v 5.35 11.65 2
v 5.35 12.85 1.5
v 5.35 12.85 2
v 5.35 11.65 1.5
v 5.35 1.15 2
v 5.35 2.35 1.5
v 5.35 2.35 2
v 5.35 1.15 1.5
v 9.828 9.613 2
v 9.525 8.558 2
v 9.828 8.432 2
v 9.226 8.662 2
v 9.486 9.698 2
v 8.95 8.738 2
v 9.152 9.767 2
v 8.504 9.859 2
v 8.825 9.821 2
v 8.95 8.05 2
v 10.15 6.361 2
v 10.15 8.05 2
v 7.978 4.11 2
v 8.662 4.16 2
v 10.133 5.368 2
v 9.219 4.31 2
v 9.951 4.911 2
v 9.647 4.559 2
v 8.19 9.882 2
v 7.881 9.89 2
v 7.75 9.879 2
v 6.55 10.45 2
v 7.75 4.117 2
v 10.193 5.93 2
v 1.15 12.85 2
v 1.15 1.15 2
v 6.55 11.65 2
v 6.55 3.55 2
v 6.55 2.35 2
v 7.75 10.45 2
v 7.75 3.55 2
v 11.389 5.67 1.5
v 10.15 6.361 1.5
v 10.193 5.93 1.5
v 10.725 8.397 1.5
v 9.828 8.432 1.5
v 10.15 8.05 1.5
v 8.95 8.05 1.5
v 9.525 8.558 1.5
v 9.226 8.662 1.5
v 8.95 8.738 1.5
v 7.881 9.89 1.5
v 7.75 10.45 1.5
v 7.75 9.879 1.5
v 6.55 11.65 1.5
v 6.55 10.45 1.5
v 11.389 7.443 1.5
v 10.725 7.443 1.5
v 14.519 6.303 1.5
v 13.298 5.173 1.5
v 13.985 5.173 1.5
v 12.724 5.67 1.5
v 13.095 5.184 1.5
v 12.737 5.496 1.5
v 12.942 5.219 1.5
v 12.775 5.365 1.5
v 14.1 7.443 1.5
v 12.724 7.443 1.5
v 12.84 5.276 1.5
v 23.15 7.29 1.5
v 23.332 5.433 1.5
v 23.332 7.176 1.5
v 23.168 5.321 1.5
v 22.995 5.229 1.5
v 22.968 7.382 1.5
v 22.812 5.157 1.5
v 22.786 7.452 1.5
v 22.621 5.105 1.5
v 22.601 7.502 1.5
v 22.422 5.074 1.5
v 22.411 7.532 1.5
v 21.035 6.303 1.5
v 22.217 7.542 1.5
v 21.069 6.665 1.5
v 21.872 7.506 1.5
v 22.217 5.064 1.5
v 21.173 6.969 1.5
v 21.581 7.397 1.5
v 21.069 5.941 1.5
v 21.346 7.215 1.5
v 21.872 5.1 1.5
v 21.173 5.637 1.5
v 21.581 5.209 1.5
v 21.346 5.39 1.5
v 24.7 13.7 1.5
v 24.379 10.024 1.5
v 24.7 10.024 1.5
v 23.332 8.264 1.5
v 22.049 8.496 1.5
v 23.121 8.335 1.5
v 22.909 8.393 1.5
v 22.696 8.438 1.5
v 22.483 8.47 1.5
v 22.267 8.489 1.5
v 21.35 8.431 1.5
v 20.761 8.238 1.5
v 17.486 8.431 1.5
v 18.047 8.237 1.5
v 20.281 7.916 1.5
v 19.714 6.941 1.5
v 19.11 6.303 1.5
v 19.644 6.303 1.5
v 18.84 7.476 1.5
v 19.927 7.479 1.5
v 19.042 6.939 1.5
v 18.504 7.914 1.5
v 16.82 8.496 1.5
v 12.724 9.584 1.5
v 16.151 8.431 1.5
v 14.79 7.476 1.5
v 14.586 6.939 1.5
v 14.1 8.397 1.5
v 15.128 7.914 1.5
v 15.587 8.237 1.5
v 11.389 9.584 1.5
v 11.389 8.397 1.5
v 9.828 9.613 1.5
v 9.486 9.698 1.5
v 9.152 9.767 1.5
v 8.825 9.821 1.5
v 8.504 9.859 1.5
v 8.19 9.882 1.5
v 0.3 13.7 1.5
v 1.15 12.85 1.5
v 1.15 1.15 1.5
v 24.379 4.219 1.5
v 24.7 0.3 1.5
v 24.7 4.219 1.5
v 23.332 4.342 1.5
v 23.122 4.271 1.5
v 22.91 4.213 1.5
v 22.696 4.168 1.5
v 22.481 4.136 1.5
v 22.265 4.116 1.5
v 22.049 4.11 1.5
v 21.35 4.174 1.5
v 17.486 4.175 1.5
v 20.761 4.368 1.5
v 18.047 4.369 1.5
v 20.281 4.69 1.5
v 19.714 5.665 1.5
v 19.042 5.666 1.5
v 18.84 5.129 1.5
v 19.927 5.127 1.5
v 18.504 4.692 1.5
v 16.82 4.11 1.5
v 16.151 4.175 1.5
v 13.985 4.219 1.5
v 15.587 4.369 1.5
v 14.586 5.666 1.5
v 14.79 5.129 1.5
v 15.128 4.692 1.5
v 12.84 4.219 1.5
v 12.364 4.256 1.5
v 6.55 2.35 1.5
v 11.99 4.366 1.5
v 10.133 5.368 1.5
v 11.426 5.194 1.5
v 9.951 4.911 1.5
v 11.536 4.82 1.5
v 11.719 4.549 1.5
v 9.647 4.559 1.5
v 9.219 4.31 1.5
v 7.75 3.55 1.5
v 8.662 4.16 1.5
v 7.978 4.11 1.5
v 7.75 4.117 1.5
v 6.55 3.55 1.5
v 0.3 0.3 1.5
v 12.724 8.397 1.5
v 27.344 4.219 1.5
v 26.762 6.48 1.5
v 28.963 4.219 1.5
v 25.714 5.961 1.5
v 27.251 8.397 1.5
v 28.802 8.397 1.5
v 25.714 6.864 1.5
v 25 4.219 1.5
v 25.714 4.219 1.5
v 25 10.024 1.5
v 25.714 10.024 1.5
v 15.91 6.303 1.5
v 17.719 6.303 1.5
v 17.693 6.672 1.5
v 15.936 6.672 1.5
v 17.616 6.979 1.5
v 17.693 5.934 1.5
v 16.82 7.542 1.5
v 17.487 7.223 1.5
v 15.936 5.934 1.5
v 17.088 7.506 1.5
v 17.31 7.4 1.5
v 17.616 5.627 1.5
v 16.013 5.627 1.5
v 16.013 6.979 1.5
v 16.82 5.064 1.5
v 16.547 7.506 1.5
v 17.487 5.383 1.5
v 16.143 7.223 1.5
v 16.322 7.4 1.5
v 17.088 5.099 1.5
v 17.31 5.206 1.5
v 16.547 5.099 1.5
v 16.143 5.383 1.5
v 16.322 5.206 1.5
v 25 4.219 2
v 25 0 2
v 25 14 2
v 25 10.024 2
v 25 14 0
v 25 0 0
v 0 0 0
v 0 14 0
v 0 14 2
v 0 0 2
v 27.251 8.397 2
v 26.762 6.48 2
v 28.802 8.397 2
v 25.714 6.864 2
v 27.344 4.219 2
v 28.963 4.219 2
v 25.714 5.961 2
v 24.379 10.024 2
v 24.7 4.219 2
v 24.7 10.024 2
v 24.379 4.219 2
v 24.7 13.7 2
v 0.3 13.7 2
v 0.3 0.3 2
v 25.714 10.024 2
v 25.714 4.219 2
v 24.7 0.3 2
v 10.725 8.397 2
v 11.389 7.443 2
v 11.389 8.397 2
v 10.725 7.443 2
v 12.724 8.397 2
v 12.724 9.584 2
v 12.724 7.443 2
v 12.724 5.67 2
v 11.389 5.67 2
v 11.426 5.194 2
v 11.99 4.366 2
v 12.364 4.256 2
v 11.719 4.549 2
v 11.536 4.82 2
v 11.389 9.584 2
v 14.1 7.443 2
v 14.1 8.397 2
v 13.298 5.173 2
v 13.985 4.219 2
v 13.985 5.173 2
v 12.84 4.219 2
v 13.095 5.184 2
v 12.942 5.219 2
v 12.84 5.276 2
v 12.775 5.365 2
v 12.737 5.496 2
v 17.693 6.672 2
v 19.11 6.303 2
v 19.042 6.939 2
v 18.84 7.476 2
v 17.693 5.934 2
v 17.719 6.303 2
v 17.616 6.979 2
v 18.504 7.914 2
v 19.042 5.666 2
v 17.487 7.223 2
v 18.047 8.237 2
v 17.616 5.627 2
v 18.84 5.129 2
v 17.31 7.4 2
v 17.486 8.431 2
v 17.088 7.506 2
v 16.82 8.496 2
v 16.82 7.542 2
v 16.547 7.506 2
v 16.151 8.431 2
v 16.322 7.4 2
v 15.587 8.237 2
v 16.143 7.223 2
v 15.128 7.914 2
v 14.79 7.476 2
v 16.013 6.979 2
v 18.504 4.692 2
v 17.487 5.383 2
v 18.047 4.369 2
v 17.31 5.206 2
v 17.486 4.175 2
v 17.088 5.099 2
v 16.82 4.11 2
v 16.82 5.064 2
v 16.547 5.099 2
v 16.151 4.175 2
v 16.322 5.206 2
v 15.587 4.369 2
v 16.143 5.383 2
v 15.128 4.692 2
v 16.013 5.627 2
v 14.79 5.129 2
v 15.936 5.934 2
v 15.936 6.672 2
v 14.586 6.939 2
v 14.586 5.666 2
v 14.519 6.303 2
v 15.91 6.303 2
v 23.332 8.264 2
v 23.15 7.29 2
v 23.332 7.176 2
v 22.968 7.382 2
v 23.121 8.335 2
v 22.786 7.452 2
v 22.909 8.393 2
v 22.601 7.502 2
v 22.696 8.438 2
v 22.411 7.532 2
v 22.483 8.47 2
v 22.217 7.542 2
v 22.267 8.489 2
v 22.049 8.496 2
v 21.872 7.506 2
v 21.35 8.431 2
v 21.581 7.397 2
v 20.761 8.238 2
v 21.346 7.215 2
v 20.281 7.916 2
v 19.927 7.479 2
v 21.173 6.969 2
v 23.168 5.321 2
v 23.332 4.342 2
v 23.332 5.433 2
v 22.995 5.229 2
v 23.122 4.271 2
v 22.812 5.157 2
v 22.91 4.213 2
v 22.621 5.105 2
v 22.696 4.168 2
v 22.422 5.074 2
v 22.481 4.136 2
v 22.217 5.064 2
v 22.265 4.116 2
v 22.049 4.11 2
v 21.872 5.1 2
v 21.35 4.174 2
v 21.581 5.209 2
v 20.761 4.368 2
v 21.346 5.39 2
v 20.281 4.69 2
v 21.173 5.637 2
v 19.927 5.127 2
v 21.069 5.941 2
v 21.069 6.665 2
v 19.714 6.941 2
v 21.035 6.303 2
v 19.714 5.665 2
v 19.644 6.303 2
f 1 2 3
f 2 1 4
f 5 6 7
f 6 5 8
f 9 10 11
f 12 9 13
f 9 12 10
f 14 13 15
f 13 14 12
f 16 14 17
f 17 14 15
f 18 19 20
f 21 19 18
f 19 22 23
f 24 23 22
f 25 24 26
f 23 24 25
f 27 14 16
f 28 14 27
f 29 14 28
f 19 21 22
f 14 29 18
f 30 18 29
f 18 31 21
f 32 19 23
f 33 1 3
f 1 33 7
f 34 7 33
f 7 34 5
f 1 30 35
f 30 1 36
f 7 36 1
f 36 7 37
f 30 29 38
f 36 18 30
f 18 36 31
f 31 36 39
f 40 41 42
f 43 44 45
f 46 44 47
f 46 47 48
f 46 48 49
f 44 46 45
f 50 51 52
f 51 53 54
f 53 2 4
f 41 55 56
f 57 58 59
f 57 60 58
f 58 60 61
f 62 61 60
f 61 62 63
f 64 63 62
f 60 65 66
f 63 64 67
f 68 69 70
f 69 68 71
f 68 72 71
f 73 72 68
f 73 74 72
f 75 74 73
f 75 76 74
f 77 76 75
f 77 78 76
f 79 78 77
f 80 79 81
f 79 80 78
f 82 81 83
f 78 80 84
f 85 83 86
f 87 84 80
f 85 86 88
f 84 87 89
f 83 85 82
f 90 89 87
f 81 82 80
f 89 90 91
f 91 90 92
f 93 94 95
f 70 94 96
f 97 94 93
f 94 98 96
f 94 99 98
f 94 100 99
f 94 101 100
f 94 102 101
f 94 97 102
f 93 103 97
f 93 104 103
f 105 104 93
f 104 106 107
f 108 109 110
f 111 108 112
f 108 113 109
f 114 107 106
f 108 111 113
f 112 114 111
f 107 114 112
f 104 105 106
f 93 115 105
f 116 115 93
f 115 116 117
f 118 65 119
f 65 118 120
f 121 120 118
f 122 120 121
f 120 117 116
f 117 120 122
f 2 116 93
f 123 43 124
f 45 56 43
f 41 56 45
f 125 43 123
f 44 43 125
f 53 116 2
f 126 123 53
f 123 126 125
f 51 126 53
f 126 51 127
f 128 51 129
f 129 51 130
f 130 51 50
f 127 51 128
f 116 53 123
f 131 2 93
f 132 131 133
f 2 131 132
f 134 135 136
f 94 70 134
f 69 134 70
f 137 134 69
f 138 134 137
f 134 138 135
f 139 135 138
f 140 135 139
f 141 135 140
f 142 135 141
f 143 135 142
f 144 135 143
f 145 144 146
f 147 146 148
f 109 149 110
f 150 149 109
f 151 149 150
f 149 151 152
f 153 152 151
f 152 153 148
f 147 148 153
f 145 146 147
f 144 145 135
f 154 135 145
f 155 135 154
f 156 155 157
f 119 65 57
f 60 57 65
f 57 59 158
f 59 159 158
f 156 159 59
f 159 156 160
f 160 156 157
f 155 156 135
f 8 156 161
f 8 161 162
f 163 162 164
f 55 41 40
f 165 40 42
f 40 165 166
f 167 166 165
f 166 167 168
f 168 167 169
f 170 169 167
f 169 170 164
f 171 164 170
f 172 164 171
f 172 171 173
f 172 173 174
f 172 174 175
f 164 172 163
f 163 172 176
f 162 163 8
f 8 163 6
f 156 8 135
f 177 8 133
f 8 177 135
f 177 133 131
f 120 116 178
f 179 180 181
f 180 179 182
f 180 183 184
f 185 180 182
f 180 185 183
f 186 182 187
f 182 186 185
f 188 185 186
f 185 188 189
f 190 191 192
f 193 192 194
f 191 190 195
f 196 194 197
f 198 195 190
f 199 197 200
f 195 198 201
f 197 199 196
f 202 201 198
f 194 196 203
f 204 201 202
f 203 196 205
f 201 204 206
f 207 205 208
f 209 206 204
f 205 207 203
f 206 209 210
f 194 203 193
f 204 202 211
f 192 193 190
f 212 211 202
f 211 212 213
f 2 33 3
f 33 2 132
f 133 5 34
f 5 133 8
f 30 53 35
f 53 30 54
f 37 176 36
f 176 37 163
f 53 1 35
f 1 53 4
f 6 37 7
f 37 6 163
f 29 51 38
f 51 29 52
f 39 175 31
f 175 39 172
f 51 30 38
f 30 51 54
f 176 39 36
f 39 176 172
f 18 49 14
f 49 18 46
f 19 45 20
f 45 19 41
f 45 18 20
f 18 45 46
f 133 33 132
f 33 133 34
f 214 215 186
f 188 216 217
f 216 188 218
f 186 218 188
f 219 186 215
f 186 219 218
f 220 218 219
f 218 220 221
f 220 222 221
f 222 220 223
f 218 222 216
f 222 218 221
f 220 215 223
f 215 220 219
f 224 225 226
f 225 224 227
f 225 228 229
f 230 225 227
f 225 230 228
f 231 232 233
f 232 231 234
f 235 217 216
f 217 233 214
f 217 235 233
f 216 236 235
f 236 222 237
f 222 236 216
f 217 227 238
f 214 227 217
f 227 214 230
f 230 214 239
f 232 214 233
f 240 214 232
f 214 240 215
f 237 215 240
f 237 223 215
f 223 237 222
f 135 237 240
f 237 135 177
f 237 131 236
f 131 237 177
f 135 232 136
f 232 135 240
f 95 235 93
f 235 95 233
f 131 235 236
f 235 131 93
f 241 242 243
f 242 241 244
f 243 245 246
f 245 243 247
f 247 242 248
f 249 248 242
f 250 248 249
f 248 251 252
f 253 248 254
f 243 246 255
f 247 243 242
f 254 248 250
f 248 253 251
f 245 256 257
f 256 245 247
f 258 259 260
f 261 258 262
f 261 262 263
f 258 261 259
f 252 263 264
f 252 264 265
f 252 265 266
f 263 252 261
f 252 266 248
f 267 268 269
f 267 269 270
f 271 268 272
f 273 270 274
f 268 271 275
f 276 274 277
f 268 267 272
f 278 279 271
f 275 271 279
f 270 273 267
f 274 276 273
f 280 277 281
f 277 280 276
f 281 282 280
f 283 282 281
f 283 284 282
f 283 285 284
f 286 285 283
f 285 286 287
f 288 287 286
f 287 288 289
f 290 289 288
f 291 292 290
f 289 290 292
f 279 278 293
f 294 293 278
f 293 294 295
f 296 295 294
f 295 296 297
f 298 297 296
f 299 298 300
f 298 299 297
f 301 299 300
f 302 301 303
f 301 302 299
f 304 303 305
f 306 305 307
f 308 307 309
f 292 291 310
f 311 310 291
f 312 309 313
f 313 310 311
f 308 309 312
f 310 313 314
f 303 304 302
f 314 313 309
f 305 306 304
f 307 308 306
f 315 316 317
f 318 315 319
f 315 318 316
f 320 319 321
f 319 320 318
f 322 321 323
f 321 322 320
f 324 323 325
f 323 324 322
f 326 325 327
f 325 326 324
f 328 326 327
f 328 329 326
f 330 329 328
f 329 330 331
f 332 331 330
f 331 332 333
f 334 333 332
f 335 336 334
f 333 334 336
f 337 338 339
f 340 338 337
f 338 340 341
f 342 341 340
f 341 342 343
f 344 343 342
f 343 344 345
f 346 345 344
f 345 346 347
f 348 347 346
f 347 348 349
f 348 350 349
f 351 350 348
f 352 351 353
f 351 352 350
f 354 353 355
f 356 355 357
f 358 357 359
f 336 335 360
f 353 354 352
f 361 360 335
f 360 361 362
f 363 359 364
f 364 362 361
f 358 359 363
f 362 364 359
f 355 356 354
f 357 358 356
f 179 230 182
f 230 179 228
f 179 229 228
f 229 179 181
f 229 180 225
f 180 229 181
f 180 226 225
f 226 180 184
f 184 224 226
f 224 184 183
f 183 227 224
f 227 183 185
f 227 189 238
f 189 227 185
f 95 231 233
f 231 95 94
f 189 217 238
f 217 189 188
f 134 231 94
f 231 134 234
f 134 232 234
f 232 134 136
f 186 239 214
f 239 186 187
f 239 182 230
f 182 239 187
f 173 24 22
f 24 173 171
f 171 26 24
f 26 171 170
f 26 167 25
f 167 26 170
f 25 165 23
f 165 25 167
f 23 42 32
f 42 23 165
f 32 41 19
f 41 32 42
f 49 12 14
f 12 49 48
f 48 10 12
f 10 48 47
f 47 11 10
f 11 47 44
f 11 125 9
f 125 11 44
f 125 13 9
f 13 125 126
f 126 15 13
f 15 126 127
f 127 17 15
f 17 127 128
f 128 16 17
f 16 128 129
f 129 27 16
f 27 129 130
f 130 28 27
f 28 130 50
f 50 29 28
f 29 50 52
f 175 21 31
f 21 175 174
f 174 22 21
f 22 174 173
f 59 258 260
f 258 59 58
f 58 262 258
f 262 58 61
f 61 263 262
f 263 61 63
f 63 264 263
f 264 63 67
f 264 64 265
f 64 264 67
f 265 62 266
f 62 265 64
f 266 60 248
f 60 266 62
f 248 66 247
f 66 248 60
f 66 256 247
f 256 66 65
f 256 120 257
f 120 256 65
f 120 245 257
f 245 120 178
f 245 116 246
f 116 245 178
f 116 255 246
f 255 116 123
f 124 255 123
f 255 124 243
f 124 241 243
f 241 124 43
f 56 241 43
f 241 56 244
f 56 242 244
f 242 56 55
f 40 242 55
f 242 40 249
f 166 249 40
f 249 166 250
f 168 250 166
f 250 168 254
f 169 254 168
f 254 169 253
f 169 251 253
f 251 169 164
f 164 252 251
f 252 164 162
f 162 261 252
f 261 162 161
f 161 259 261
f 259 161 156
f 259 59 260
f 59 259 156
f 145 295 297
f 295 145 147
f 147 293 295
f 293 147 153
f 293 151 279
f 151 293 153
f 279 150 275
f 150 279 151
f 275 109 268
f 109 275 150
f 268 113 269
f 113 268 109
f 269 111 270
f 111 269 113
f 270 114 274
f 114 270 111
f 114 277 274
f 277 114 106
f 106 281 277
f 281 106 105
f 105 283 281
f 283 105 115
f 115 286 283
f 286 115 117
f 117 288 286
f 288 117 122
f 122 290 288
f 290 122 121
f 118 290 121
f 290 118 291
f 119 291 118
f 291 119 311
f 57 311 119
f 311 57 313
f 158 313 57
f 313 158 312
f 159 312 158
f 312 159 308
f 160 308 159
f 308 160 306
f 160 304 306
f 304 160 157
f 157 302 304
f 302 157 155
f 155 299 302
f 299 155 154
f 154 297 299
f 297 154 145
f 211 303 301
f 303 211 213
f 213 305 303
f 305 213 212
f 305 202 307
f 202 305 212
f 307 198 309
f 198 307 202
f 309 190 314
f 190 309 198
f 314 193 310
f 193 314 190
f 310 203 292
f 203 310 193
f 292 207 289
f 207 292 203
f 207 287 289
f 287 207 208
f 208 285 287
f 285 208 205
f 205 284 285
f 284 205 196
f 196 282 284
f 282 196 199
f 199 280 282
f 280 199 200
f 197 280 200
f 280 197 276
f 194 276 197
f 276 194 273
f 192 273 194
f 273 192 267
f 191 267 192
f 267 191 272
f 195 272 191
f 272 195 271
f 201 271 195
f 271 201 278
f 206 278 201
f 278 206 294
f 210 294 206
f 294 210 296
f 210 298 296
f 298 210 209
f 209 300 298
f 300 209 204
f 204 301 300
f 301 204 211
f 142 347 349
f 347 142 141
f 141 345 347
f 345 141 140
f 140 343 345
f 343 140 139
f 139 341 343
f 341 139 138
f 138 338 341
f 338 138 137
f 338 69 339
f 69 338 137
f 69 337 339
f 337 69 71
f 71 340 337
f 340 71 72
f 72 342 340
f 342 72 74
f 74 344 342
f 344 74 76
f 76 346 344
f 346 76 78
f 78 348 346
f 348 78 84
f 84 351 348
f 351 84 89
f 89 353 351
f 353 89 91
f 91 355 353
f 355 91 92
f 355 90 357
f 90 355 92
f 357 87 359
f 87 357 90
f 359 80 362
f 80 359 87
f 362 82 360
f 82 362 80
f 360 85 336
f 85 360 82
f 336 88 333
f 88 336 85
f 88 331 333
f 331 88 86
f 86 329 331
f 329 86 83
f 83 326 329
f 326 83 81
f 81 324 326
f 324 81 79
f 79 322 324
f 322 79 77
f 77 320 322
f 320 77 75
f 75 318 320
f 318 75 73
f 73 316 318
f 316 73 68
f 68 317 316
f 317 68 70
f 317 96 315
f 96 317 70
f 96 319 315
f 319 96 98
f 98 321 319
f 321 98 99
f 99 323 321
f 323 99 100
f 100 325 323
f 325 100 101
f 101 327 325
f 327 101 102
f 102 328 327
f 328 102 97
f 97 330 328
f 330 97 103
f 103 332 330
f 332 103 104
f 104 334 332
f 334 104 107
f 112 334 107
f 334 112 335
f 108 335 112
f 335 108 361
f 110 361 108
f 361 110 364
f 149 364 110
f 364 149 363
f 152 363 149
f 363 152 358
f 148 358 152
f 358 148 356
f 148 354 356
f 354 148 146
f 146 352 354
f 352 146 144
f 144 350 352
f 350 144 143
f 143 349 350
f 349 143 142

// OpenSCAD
// file: CommonModules.scad
//    $$$$$$\   $$$$$$\   $$$$$$\  $$\   $$\ $$$$$$\ $$$$$$$\  $$$$$$$$\ 
//    $$  __$$\ $$  __$$\ $$  __$$\ $$ |  $$ |\_$$  _|$$  __$$\ $$  _____|
//    $$ /  $$ |$$ /  \__|$$ /  $$ |$$ |  $$ |  $$ |  $$ |  $$ |$$ |      
//    $$$$$$$$ |$$ |      $$ |  $$ |$$ |  $$ |  $$ |  $$$$$$$  |$$$$$\    
//    $$  __$$ |$$ |      $$ |  $$ |$$ |  $$ |  $$ |  $$  __$$< $$  __|   
//    $$ |  $$ |$$ |  $$\ $$ $$\$$ |$$ |  $$ |  $$ |  $$ |  $$ |$$ |      
//    $$ |  $$ |\$$$$$$  |\$$$$$$ / \$$$$$$  |$$$$$$\ $$ |  $$ |$$$$$$$$\ 
//    \__|  \__| \______/  \___$$$\  \______/ \______|\__|  \__|\________|
//                            \___|                                      
//      
//       Print and play - OpenScad project - by Bekkalizer and ChatGPT
// 
// This file is part of the Acquire stl project.
// Copyright (C) 2025 Bekkalizer
//
// Acquire stl project is free software: you can redistribute it and/or modify
// it under the terms of the GNU General Public License as published
// by the Free Software Foundation, either version 3 of the License,
// or (at your option) any later version.
//
// Acquire stl project is distributed in the hope that it will be useful,
// but WITHOUT ANY WARRANTY; without even the implied warranty of
// MERCHANTABILITY or FITNESS FOR A PARTICULAR PURPOSE. See the
// GNU General Public License for more details.
//
// You should have received a copy of the GNU General Public License
// along with this program. If not, see <https://www.gnu.org/licenses/>.

module cube_with_extruded_bottom( cube_size = [19.5, 19.5, 5] ) {
    //Main build script parameters:
    max_width = 19.2;
    top_lip = 2;
    top_height = 3;
    //Calculated hole size:
    inside_margins = 1;
    hole_width = max_width - 2 * (top_lip) + inside_margins;
    hole_height = top_height + inside_margins;
    
    hole_size = [hole_width, hole_width, hole_height]; // Hole dimensions (same height as cube)
    hole_offset = [(cube_size[0] - hole_size[0]) / 2, (cube_size[1] - hole_size[1]) / 2, -0.1]; // Centered on bottom
    difference() {
        // Main Cube
        cube(cube_size);
        
        // Hole Cube (subtracting from bottom)
        translate(hole_offset)
            cube(hole_size);
    }
}
// main file
//    $$$$$$\   $$$$$$\   $$$$$$\  $$\   $$\ $$$$$$\ $$$$$$$\  $$$$$$$$\ 
//    $$  __$$\ $$  __$$\ $$  __$$\ $$ |  $$ |\_$$  _|$$  __$$\ $$  _____|
//    $$ /  $$ |$$ /  \__|$$ /  $$ |$$ |  $$ |  $$ |  $$ |  $$ |$$ |      
//    $$$$$$$$ |$$ |      $$ |  $$ |$$ |  $$ |  $$ |  $$$$$$$  |$$$$$\    
//    $$  __$$ |$$ |      $$ |  $$ |$$ |  $$ |  $$ |  $$  __$$< $$  __|   
//    $$ |  $$ |$$ |  $$\ $$ $$\$$ |$$ |  $$ |  $$ |  $$ |  $$ |$$ |      
//    $$ |  $$ |\$$$$$$  |\$$$$$$ / \$$$$$$  |$$$$$$\ $$ |  $$ |$$$$$$$$\ 
//    \__|  \__| \______/  \___$$$\  \______/ \______|\__|  \__|\________|
//                            \___|                                      
//      
//       Print and play - OpenScad project - by Bekkalizer and ChatGPT
// 
// This file is part of the Acquire stl project.
// Copyright (C) 2025 Bekkalizer
//
// Acquire stl project is free software: you can redistribute it and/or modify
// it under the terms of the GNU General Public License as published
// by the Free Software Foundation, either version 3 of the License,
// or (at your option) any later version.
//
// Acquire stl project is distributed in the hope that it will be useful,
// but WITHOUT ANY WARRANTY; without even the implied warranty of
// MERCHANTABILITY or FITNESS FOR A PARTICULAR PURPOSE. See the
// GNU General Public License for more details.
//
// You should have received a copy of the GNU General Public License
// along with this program. If not, see <https://www.gnu.org/licenses/>.

use <CommonModules.scad>

// ============== Parameters ==============
width = 14;
height = 25;
thickness = 1.5;
extrusion = 0.5;

label = "Stock";

frame_width = 0.3;

font_name = "DIN Condensed:style=Bold";
font_size = 5.5;

symbol_factor = 0.6;
symbol_bottom_width = 19.5 * symbol_factor;
symbol_bottom_height = 5 * symbol_factor;
symbol_step_height = 2 * symbol_factor;
symbol_step_width = 2 * symbol_factor;
symbol_number_of_steps = 4;

symbol_margin = (width-symbol_bottom_width)/2;

// Draw the certificate main and frame;
cube([height,width,thickness]);
cube([height,frame_width,thickness + extrusion]);
cube([frame_width,width,thickness + extrusion]);
translate([height - frame_width,0,0])
    cube([frame_width,width,thickness + extrusion]);
translate([0,width - frame_width,0])
    cube([height,frame_width,thickness + extrusion]);

translate ([symbol_margin,symbol_margin,thickness]) {
    cube([symbol_bottom_height, symbol_bottom_width, extrusion]);
    
    
    for( i = [0 : symbol_number_of_steps] ) {
        echo(symbol_bottom_width - symbol_step_width*2*i);
        
        translate([symbol_step_height*i + symbol_bottom_height,symbol_step_width*i,0]) {
            cube([symbol_step_height, 
                symbol_bottom_width - symbol_step_width*2*i, 
                extrusion]);
        }
    }
}

// Etched text on top
translate([(height + symbol_margin + symbol_bottom_height + symbol_step_height * symbol_number_of_steps)/2,width/2,thickness])
    linear_extrude(height = extrusion)
        text(label, size = font_size, font = font_name, halign = "center", valign = "center");
